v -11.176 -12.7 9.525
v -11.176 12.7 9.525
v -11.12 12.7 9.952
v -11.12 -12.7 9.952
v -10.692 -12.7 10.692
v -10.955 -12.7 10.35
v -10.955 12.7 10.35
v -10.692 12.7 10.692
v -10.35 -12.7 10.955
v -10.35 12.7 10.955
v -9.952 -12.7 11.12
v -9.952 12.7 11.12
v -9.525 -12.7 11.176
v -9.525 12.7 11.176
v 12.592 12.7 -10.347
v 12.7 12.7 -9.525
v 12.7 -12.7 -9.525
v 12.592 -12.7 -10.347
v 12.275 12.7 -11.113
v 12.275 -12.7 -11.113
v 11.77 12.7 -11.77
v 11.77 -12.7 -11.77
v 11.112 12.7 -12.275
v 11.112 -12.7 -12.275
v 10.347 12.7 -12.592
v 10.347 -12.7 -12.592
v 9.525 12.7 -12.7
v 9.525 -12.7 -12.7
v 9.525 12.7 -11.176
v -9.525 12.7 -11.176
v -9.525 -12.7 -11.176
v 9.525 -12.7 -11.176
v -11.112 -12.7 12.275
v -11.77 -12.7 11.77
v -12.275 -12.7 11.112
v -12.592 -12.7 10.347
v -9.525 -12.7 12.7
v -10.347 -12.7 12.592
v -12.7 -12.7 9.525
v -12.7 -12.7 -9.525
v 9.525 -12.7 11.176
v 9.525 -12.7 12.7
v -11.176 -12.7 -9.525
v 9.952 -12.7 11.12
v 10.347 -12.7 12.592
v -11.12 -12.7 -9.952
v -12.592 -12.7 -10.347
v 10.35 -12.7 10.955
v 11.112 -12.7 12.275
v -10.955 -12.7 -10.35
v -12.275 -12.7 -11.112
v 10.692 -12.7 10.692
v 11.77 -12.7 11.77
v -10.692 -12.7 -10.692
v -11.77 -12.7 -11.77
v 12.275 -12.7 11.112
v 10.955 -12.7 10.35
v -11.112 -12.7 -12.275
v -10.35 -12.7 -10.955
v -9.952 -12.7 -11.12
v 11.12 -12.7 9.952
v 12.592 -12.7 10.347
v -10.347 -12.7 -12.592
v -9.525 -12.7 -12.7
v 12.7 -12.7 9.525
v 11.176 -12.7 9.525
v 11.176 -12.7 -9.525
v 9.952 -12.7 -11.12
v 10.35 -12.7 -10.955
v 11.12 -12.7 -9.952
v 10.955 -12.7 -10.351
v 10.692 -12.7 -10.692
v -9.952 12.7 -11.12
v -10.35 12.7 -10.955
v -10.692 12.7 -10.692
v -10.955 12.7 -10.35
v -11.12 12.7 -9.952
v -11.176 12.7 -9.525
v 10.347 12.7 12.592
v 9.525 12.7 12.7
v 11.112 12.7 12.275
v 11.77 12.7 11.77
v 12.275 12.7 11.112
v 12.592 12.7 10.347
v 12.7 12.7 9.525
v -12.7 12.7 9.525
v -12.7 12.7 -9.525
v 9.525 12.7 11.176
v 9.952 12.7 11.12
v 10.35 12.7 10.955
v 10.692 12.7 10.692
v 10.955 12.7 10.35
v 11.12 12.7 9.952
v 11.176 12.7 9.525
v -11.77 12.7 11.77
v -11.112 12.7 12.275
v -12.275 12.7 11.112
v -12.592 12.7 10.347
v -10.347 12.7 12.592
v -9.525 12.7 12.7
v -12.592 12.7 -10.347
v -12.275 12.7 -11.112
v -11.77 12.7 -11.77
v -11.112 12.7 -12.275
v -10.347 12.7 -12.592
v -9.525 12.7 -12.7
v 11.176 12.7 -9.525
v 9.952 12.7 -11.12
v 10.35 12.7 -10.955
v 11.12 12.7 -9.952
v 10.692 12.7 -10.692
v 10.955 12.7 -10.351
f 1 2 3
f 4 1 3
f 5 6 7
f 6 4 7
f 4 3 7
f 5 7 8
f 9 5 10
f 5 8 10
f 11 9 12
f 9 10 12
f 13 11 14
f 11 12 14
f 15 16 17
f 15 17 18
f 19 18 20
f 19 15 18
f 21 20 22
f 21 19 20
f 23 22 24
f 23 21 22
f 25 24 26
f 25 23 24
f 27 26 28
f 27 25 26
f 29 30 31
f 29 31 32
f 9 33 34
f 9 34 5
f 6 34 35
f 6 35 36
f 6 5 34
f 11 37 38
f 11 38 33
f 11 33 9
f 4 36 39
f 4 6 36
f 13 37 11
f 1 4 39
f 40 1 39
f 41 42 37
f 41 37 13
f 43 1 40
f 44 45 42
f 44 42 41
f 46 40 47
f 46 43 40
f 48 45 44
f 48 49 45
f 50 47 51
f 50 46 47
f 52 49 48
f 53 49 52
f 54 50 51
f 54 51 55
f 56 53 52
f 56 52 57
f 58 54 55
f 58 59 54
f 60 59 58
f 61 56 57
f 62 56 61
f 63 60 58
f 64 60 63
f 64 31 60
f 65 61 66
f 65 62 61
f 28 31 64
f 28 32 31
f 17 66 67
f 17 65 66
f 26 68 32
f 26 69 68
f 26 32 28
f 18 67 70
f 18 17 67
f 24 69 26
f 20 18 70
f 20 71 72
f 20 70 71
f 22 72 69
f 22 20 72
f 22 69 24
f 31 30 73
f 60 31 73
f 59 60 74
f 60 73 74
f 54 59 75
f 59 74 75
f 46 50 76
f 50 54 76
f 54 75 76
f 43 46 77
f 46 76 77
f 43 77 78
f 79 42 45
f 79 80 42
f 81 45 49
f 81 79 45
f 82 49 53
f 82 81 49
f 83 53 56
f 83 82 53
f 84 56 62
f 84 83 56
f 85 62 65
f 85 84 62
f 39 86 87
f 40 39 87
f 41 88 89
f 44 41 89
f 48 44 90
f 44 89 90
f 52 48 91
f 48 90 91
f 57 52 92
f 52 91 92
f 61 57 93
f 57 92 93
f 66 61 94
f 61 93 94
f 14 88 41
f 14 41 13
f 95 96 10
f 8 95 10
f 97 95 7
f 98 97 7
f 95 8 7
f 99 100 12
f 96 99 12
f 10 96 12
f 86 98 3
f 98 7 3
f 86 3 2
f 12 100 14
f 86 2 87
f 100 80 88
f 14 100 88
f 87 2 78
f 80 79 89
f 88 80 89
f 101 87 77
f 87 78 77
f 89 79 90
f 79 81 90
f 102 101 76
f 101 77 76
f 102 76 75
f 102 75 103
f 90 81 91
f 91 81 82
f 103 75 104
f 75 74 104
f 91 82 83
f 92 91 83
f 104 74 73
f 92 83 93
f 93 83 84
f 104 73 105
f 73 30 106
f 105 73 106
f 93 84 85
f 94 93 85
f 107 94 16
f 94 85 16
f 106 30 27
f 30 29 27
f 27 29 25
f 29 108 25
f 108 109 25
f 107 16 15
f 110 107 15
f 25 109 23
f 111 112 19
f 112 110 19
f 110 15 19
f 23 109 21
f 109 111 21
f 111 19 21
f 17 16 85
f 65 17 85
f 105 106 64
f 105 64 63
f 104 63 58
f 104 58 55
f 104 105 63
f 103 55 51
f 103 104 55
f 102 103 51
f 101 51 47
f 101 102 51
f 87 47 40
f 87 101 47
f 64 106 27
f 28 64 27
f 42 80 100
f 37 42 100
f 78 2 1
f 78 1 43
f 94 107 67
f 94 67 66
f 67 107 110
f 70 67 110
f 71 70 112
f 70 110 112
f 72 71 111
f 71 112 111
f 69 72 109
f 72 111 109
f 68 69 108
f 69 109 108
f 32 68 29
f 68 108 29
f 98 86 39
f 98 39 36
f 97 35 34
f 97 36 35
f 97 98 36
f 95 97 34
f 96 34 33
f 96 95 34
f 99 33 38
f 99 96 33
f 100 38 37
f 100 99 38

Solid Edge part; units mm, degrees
sketch "Sketch1" plane through (0, 0, 0) normal (0, -1, 0) x (1, 0, 0)
  line L0 (9.525, 12.7) -> (-9.525, 12.7)
  arc A0 (-9.525, 12.7) -> (-12.7, 9.525) centre (-9.525, 9.525) ccw
  line L1 (-12.7, 9.525) -> (-12.7, -9.525)
  arc A1 (-9.525, -12.7) -> (-12.7, -9.525) centre (-9.525, -9.525) cw
  line L2 (-9.525, -12.7) -> (9.525, -12.7)
  arc A2 (9.525, -12.7) -> (12.7, -9.525) centre (9.525, -9.525) ccw
  line L3 (12.7, -9.525) -> (12.7, 9.525)
  arc A3 (12.7, 9.525) -> (9.525, 12.7) centre (9.525, 9.525) ccw
  line L4 (9.525, 11.176) -> (-9.525, 11.176)
  arc A4 (-9.525, 11.176) -> (-11.176, 9.525) centre (-9.525, 9.525) ccw
  line L5 (-11.176, 9.525) -> (-11.176, -9.525)
  arc A5 (-11.176, -9.525) -> (-9.525, -11.176) centre (-9.525, -9.525) ccw
  line L6 (-9.525, -11.176) -> (9.525, -11.176)
  arc A6 (9.525, -11.176) -> (11.176, -9.525) centre (9.525, -9.525) ccw
  line L7 (11.176, -9.525) -> (11.176, 9.525)
  arc A7 (11.176, 9.525) -> (9.525, 11.176) centre (9.525, 9.525) ccw
extrude "Protrusion1" add sketch "Sketch1" along normal mid plane 25.4
properties material "Steel"
